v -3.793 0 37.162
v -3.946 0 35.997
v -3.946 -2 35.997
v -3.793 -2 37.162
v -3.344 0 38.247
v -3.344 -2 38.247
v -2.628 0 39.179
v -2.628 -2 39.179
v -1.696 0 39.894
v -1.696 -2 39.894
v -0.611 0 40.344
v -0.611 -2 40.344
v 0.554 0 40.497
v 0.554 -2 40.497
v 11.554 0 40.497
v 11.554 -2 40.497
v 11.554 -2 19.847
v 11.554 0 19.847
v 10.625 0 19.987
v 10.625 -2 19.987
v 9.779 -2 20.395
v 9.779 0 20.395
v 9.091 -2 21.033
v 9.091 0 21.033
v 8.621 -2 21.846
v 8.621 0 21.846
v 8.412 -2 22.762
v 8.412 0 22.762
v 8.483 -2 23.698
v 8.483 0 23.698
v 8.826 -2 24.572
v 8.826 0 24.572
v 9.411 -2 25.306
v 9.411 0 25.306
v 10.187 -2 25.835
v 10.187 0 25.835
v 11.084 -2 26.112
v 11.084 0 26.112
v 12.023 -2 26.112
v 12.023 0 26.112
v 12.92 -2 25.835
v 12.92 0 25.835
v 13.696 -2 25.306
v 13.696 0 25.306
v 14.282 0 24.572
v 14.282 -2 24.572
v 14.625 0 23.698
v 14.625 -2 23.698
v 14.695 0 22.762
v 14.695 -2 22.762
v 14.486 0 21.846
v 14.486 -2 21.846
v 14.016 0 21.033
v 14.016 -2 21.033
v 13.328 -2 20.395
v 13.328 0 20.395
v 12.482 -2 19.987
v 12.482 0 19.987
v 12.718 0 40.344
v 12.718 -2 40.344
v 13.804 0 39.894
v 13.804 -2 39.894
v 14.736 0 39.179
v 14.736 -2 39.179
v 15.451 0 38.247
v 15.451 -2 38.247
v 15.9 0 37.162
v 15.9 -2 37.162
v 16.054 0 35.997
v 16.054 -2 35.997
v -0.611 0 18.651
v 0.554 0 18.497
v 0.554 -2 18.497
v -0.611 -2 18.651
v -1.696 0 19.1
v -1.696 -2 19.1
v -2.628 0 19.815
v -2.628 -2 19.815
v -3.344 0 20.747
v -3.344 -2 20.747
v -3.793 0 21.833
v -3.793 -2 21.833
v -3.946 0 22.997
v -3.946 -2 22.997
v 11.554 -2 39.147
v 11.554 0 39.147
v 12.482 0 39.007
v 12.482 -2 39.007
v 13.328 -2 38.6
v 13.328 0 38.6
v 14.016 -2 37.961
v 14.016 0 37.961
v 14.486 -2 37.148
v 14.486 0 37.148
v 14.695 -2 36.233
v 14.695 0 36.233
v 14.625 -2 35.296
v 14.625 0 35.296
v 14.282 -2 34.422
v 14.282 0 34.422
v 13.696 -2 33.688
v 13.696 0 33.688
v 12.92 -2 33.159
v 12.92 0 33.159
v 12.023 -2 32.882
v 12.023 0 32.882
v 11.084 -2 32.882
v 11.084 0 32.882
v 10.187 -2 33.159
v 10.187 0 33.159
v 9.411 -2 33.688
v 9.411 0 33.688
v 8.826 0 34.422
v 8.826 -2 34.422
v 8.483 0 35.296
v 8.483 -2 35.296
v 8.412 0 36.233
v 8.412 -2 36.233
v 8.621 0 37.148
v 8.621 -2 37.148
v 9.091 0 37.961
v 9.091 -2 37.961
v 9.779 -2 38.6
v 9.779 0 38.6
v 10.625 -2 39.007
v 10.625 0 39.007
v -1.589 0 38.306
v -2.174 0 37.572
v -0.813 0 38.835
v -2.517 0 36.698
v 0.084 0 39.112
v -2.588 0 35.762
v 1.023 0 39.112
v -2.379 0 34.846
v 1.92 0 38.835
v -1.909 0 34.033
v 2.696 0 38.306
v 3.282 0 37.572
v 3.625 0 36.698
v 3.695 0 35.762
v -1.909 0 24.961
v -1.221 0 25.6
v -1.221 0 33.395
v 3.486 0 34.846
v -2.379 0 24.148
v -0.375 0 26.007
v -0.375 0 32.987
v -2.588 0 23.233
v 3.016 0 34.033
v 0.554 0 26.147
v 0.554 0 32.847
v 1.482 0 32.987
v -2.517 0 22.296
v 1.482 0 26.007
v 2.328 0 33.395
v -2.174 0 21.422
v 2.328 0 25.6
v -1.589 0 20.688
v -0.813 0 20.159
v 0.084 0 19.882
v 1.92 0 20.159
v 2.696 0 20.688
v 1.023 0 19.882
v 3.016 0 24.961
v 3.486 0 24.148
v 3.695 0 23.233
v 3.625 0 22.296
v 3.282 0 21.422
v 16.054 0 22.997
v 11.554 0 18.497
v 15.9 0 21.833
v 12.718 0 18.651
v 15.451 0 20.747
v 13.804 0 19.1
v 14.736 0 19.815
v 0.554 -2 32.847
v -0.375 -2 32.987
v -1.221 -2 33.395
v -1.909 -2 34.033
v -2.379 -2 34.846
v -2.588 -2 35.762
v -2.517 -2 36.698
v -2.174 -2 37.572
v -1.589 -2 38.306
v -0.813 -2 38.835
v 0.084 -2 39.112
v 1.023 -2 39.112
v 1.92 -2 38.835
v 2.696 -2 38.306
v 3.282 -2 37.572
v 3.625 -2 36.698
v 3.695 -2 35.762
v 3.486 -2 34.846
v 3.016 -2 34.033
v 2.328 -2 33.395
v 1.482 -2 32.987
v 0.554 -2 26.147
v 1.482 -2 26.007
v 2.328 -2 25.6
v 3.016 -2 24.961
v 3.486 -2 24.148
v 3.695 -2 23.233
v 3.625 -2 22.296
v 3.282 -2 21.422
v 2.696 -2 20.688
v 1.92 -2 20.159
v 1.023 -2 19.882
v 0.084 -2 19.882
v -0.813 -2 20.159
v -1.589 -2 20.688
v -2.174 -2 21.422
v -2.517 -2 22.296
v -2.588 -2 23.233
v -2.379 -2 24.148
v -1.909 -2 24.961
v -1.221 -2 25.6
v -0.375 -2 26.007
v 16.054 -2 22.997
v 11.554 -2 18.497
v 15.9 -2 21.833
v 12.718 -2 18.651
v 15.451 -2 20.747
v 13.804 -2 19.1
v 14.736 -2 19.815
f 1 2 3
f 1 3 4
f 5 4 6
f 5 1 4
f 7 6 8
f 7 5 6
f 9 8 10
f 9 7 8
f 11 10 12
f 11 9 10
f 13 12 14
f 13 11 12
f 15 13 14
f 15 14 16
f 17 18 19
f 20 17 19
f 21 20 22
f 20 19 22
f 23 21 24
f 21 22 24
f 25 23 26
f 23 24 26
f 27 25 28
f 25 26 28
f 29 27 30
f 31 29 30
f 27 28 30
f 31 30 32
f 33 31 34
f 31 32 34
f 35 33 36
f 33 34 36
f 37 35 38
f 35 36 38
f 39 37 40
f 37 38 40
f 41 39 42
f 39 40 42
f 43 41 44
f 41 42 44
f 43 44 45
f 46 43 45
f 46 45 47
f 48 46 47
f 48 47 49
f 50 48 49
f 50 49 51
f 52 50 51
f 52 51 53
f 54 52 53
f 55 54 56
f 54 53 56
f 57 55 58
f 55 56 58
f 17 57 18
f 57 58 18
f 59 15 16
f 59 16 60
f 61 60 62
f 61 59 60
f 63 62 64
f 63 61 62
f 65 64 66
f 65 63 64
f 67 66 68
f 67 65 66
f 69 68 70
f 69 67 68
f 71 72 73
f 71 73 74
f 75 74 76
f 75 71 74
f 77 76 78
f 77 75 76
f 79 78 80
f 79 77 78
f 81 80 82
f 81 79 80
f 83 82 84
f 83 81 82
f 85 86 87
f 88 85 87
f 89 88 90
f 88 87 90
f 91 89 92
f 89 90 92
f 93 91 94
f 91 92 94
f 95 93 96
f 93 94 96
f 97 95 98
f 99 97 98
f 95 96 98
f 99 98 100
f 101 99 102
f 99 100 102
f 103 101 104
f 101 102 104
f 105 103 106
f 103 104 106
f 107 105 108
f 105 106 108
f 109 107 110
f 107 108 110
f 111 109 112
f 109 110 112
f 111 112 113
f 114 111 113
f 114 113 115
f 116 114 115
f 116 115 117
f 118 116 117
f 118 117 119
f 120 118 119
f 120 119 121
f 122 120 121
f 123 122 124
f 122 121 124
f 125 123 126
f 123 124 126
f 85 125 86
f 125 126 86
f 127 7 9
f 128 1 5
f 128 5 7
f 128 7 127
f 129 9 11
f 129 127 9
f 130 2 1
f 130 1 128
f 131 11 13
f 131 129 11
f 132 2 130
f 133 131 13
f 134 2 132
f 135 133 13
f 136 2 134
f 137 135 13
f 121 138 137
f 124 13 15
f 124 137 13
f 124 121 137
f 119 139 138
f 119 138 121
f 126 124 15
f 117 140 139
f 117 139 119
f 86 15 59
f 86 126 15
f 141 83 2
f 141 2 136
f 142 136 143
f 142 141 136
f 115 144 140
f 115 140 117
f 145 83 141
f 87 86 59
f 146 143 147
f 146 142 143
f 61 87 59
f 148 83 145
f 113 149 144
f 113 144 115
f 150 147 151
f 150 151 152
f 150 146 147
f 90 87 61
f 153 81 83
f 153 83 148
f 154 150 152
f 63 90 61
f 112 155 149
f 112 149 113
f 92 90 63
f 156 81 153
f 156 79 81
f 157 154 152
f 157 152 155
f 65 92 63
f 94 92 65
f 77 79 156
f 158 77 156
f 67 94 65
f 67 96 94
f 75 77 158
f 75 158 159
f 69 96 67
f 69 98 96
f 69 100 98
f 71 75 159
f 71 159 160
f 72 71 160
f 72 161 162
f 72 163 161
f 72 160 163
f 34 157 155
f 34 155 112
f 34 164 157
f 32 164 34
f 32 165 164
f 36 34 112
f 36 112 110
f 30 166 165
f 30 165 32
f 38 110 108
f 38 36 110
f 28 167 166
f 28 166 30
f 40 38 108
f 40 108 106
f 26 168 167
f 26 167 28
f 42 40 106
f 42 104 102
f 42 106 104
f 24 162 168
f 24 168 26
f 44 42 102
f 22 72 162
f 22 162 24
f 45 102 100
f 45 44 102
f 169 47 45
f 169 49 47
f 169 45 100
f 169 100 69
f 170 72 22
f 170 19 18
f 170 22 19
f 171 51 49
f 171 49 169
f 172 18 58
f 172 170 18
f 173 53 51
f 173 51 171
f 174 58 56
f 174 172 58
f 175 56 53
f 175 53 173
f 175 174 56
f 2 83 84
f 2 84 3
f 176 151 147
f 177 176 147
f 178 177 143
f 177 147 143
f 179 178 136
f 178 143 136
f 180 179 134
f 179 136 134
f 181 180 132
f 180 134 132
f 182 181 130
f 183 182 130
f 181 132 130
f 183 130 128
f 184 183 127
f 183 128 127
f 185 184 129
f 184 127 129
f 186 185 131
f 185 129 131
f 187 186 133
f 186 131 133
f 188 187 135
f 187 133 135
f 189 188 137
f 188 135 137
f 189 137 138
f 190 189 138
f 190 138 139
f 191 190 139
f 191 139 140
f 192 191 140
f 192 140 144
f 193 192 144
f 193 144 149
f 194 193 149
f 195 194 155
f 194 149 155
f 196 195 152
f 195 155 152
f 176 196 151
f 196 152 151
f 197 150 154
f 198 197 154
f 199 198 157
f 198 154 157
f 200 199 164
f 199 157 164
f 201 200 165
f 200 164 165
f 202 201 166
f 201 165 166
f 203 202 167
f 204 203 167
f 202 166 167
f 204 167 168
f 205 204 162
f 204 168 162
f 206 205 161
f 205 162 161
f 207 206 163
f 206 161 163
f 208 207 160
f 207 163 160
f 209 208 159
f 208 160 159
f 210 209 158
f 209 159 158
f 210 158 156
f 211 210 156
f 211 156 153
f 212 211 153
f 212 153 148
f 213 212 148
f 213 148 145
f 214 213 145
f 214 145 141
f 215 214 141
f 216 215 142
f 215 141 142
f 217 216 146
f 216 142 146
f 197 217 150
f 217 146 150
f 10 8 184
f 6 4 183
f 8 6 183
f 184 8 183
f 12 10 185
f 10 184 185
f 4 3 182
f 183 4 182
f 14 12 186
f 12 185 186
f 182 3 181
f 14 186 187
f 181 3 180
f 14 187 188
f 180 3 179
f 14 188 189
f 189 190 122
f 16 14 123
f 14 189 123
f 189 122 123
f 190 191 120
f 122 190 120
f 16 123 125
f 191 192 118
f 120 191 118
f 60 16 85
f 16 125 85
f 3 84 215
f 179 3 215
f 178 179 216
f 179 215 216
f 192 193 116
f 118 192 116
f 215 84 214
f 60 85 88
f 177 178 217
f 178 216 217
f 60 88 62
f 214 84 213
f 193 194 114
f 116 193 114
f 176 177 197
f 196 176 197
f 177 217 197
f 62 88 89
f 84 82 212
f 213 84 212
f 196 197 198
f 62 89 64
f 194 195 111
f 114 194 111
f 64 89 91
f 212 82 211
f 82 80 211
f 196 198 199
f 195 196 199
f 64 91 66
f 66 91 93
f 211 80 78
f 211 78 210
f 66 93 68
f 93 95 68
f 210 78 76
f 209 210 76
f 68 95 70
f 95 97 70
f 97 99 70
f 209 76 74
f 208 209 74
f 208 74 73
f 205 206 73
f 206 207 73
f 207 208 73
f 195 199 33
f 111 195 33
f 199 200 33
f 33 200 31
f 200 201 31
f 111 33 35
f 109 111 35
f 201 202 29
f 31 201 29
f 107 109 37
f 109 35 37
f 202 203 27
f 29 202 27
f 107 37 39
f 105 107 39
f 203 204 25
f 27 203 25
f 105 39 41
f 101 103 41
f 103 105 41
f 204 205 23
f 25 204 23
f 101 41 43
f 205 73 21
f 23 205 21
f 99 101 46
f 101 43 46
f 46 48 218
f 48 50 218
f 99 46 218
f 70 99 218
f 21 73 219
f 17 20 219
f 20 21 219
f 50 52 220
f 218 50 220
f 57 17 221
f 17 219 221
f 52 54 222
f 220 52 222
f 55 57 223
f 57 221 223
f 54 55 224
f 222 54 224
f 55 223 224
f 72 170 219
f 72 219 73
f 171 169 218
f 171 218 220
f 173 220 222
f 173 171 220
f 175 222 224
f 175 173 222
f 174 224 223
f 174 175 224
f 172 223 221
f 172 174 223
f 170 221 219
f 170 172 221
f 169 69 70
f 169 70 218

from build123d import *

# Parameters (mm, degrees)
SKETCH2_R           = 3.15
BOSS_EXTRUDE1_DEPTH = 2


with BuildPart() as part:
    # Sketch2 → Boss-Extrude1 (new body)
    with BuildSketch(Plane(origin=(0, 0, 0), x_dir=(1, 0, 0), z_dir=(0, 1, 0))):
        with BuildLine():
            Line((0.553571832, -40.497268471), (11.553571832, -40.497268471))
            ThreePointArc((11.553571832, -40.497268471), (14.735552347, -39.179248986), (16.053571832, -35.997268471))
            Line((16.053571832, -35.997268471), (16.053571832, -22.997268471))
            ThreePointArc((16.053571832, -22.997268471), (14.735552347, -19.815287955), (11.553571832, -18.497268471))
            Line((11.553571832, -18.497268471), (0.553571832, -18.497268471))
            ThreePointArc((0.553571832, -18.497268471), (-2.628408684, -19.815287955), (-3.946428168, -22.997268471))
            Line((-3.946428168, -22.997268471), (-3.946428168, -35.997268471))
            ThreePointArc((-3.946428168, -35.997268471), (-2.628408684, -39.179248986), (0.553571832, -40.497268471))
        make_face()
        with Locations(Location((11.553571832, -35.997268471, 0), (0, 0, 270))):
            Circle(SKETCH2_R, mode=Mode.SUBTRACT)
        with Locations(Location((11.553571832, -22.997268471, 0), (0, 0, 90))):
            Circle(SKETCH2_R, mode=Mode.SUBTRACT)
        with Locations(Location((0.553571832, -22.997268471, 0), (0, 0, 270))):
            Circle(SKETCH2_R, mode=Mode.SUBTRACT)
        with Locations(Location((0.553571832, -35.997268471, 0), (0, 0, 90))):
            Circle(SKETCH2_R, mode=Mode.SUBTRACT)
    extrude(amount=-BOSS_EXTRUDE1_DEPTH)


solid = part.part
